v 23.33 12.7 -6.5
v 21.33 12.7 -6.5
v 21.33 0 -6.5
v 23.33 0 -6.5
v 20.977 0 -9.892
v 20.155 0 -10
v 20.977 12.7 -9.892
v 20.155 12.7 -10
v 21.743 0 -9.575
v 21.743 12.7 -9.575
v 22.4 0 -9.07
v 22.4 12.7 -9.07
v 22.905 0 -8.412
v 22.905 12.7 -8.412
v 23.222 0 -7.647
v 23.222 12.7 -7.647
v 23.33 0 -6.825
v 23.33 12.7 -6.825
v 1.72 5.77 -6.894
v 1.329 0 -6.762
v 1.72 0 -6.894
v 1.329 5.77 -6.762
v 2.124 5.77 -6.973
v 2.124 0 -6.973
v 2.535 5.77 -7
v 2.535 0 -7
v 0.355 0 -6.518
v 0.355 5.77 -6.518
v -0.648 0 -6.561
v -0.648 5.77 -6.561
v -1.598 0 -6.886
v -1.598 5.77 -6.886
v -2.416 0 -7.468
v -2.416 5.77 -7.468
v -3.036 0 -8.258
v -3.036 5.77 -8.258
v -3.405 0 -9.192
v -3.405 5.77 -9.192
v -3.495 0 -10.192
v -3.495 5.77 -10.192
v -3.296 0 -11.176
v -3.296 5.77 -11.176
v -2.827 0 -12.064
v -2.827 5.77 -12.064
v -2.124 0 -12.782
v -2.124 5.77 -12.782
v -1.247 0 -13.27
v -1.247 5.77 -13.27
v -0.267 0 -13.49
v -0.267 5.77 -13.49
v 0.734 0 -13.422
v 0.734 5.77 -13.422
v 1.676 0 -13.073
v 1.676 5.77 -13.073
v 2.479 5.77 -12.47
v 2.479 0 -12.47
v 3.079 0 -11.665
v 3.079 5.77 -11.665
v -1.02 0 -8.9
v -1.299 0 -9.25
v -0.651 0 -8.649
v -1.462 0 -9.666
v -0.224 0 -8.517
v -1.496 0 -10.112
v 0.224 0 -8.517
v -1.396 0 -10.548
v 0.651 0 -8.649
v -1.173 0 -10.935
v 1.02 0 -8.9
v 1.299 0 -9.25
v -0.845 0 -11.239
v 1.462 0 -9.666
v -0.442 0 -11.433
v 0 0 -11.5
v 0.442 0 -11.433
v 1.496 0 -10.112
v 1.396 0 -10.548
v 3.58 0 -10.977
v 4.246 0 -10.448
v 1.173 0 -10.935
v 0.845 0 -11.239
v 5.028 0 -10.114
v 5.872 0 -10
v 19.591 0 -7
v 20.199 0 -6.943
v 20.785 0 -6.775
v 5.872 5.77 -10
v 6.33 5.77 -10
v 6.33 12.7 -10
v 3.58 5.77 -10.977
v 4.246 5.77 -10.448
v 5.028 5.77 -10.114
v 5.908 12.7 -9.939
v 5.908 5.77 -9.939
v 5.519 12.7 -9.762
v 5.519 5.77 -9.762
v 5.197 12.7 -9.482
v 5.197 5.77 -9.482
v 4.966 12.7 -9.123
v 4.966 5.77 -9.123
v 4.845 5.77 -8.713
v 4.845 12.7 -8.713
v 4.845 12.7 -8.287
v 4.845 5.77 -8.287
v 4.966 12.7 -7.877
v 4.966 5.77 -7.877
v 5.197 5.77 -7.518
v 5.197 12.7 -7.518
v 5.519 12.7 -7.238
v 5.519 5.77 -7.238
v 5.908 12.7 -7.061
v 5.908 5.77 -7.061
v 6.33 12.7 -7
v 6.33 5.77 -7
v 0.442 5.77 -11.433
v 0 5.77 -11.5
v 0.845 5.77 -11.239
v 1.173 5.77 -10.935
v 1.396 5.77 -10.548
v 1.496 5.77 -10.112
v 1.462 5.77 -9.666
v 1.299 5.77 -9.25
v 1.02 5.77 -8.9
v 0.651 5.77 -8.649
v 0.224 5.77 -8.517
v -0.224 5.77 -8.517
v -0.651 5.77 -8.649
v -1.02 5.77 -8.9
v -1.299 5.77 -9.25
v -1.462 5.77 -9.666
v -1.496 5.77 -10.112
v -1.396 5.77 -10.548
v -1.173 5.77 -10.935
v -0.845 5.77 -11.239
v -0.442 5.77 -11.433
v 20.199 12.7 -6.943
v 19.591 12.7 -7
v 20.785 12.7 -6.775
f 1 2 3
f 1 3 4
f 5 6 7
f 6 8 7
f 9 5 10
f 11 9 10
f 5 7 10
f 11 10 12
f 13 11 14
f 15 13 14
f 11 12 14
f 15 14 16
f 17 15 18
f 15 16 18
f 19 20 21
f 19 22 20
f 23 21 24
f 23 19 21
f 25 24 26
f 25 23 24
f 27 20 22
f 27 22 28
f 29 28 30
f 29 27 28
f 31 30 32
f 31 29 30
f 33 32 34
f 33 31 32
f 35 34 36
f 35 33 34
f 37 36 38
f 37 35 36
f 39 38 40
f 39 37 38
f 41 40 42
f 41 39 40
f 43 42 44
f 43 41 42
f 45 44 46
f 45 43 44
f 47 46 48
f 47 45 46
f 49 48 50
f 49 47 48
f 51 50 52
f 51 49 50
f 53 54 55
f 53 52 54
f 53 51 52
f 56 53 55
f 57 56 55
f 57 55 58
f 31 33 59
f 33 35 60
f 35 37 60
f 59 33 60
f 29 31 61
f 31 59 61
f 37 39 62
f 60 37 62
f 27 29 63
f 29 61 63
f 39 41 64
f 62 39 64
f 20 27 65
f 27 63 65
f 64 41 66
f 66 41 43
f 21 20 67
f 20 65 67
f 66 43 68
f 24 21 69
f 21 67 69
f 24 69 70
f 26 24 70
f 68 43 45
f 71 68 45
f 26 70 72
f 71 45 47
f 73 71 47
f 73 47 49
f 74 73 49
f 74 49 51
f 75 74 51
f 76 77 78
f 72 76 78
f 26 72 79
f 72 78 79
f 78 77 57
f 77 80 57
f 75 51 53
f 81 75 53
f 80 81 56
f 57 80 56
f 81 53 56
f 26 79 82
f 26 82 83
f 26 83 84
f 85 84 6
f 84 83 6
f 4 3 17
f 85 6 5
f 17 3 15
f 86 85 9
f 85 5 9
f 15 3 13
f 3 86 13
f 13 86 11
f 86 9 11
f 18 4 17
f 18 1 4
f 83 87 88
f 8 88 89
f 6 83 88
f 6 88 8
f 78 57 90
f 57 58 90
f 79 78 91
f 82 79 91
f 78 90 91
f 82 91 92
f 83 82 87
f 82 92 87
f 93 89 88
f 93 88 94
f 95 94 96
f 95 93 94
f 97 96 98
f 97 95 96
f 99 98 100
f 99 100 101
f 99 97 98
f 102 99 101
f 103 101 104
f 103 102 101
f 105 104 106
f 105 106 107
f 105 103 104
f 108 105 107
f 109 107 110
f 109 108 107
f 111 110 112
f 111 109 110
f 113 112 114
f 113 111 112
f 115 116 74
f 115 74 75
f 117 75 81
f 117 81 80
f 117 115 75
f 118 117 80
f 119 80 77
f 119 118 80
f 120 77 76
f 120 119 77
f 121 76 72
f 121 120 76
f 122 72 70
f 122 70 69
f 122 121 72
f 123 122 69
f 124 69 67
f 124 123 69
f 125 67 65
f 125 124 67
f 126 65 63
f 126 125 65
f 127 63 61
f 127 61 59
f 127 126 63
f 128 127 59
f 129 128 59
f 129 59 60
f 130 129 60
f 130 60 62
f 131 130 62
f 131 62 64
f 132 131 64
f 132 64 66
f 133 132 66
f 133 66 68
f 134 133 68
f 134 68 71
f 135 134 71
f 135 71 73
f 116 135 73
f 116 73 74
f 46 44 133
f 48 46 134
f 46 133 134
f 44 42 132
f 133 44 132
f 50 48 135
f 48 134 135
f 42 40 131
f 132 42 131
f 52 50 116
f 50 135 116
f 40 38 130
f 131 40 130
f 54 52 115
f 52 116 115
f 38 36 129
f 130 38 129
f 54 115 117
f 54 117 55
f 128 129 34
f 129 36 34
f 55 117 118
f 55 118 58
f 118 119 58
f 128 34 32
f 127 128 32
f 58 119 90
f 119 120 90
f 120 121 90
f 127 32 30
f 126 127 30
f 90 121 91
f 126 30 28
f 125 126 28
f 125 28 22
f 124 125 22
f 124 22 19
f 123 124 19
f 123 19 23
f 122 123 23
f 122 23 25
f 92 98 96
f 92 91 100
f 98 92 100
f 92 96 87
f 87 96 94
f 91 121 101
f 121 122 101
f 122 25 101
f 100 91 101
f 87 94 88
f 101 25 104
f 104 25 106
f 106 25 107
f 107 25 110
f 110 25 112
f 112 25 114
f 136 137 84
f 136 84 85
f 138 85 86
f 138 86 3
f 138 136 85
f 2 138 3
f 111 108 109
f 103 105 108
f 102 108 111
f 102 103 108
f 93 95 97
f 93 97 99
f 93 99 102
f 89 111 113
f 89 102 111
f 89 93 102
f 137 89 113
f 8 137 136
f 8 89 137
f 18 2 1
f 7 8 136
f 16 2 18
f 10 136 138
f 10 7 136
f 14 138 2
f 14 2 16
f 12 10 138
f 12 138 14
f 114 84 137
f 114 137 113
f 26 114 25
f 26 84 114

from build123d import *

# Parameters (mm, degrees)
SKETCH1_R           = 3.5
BOSS_EXTRUDE1_DEPTH = 12.7
CUT_EXTRUDE1_DEPTH  = 6.93
SKETCH3_R           = 1.5
CUT_EXTRUDE2_DEPTH  = 6.77
SKETCH4_R           = 2
CUT_EXTRUDE3_DEPTH  = 10
SKETCH5_W           = 2
SKETCH5_H           = 0.5
BOSS_EXTRUDE2_DEPTH = 12.7
FILLET1_R           = 3.175
SKETCH6_R           = 1.585
CUT_EXTRUDE4_DEPTH  = 1.5


with BuildPart() as part:
    # Sketch1 → Boss-Extrude1 (new body)
    with BuildSketch(Plane(origin=(0, 0, 0), x_dir=(1, 0, 0), z_dir=(0, 1, 0))):
        Circle(SKETCH1_R)
        with BuildLine():
            ThreePointArc((1.802775638, 3), (3.046285831, 1.723410176), (3.5, 0))
            Line((3.5, 0), (23.330212793, 0))
            Line((23.330212793, 0), (23.330212793, 3))
            Line((23.330212793, 3), (1.802775638, 3))
        make_face()
    extrude(amount=BOSS_EXTRUDE1_DEPTH)

    # Sketch2 → Cut-Extrude1 (cut)
    with BuildSketch(Plane(origin=(0, 12.7, 0), x_dir=(1, 0, 0), z_dir=(0, 1, 0))):
        with BuildLine():
            ThreePointArc((6.330212793, 3), (-6.149926342, 1.5), (6.330212793, 0))
            Line((6.330212793, 0), (3.5, 0))
            ThreePointArc((3.5, 0), (-3.046285831, -1.723410176), (1.802775638, 3))
            Line((1.802775638, 3), (6.330212793, 3))
        make_face()
        with BuildLine():
            Line((3.5, 0), (6.330212793, 0))
            ThreePointArc((6.330212793, 0), (4.830212793, 1.5), (6.330212793, 3))
            Line((6.330212793, 3), (1.802775638, 3))
            ThreePointArc((1.802775638, 3), (-3.046285831, -1.723410176), (3.5, 0))
        make_face()
    extrude(amount=-CUT_EXTRUDE1_DEPTH, mode=Mode.SUBTRACT)

    # Sketch3 → Cut-Extrude2 (cut, through all)
    with BuildSketch(Plane(origin=(0, 5.77, 0), x_dir=(1, 0, 0), z_dir=(0, 1, 0))):
        with Locations(Location((0, 0, 0), (0, 0, 270))):  # turned: the seam where the file's is
            Circle(SKETCH3_R)
    extrude(amount=-CUT_EXTRUDE2_DEPTH, mode=Mode.SUBTRACT)


with BuildPart() as body_2:
    # Mirror1: mirrored copy
    add(part.part.mirror(Plane.XY.offset(-5)))

    # Sketch4 → Cut-Extrude3 (cut)
    with BuildSketch(Plane.XY.offset(-7)):
        with Locations((59.285262001, -42.831378851)):
            Circle(SKETCH4_R)
        with Locations((59.285262001, -47.531378851)):
            Circle(SKETCH4_R)
    extrude(amount=-CUT_EXTRUDE3_DEPTH, mode=Mode.SUBTRACT)

    # Sketch5 → Boss-Extrude2 (add)
    with BuildSketch(Plane(origin=(0, 12.7, 0), x_dir=(1, 0, 0), z_dir=(0, 1, 0))):
        with BuildLine():
            Line((21.330212793, 6.5), (21.330212793, 7))
            Line((21.330212793, 7), (19.59096008, 7))
            ThreePointArc((19.59096008, 7), (20.495808134, 6.872518864), (21.330212793, 6.5))
        make_face()
        with Locations((22.330212793, 6.75)):
            Rectangle(SKETCH5_W, SKETCH5_H)
    extrude(amount=-BOSS_EXTRUDE2_DEPTH)

    # Fillet1
    fillet1_edges = [body_2.edges().sort_by_distance(p)[0] for p in [
        (1.802775638, 2.885, -7),
        (3.5, 2.885, -10),
        (23.330212793, 6.35, -10),
    ]]
    fillet(fillet1_edges, radius=FILLET1_R)

    # Sketch6 → Cut-Extrude4 (cut)
    with BuildSketch(Plane.XY.offset(-7)):
        with Locations((66.743933259, -45.181378851)):
            Circle(SKETCH6_R)
    extrude(amount=-CUT_EXTRUDE4_DEPTH, mode=Mode.SUBTRACT)


solid = body_2.part
